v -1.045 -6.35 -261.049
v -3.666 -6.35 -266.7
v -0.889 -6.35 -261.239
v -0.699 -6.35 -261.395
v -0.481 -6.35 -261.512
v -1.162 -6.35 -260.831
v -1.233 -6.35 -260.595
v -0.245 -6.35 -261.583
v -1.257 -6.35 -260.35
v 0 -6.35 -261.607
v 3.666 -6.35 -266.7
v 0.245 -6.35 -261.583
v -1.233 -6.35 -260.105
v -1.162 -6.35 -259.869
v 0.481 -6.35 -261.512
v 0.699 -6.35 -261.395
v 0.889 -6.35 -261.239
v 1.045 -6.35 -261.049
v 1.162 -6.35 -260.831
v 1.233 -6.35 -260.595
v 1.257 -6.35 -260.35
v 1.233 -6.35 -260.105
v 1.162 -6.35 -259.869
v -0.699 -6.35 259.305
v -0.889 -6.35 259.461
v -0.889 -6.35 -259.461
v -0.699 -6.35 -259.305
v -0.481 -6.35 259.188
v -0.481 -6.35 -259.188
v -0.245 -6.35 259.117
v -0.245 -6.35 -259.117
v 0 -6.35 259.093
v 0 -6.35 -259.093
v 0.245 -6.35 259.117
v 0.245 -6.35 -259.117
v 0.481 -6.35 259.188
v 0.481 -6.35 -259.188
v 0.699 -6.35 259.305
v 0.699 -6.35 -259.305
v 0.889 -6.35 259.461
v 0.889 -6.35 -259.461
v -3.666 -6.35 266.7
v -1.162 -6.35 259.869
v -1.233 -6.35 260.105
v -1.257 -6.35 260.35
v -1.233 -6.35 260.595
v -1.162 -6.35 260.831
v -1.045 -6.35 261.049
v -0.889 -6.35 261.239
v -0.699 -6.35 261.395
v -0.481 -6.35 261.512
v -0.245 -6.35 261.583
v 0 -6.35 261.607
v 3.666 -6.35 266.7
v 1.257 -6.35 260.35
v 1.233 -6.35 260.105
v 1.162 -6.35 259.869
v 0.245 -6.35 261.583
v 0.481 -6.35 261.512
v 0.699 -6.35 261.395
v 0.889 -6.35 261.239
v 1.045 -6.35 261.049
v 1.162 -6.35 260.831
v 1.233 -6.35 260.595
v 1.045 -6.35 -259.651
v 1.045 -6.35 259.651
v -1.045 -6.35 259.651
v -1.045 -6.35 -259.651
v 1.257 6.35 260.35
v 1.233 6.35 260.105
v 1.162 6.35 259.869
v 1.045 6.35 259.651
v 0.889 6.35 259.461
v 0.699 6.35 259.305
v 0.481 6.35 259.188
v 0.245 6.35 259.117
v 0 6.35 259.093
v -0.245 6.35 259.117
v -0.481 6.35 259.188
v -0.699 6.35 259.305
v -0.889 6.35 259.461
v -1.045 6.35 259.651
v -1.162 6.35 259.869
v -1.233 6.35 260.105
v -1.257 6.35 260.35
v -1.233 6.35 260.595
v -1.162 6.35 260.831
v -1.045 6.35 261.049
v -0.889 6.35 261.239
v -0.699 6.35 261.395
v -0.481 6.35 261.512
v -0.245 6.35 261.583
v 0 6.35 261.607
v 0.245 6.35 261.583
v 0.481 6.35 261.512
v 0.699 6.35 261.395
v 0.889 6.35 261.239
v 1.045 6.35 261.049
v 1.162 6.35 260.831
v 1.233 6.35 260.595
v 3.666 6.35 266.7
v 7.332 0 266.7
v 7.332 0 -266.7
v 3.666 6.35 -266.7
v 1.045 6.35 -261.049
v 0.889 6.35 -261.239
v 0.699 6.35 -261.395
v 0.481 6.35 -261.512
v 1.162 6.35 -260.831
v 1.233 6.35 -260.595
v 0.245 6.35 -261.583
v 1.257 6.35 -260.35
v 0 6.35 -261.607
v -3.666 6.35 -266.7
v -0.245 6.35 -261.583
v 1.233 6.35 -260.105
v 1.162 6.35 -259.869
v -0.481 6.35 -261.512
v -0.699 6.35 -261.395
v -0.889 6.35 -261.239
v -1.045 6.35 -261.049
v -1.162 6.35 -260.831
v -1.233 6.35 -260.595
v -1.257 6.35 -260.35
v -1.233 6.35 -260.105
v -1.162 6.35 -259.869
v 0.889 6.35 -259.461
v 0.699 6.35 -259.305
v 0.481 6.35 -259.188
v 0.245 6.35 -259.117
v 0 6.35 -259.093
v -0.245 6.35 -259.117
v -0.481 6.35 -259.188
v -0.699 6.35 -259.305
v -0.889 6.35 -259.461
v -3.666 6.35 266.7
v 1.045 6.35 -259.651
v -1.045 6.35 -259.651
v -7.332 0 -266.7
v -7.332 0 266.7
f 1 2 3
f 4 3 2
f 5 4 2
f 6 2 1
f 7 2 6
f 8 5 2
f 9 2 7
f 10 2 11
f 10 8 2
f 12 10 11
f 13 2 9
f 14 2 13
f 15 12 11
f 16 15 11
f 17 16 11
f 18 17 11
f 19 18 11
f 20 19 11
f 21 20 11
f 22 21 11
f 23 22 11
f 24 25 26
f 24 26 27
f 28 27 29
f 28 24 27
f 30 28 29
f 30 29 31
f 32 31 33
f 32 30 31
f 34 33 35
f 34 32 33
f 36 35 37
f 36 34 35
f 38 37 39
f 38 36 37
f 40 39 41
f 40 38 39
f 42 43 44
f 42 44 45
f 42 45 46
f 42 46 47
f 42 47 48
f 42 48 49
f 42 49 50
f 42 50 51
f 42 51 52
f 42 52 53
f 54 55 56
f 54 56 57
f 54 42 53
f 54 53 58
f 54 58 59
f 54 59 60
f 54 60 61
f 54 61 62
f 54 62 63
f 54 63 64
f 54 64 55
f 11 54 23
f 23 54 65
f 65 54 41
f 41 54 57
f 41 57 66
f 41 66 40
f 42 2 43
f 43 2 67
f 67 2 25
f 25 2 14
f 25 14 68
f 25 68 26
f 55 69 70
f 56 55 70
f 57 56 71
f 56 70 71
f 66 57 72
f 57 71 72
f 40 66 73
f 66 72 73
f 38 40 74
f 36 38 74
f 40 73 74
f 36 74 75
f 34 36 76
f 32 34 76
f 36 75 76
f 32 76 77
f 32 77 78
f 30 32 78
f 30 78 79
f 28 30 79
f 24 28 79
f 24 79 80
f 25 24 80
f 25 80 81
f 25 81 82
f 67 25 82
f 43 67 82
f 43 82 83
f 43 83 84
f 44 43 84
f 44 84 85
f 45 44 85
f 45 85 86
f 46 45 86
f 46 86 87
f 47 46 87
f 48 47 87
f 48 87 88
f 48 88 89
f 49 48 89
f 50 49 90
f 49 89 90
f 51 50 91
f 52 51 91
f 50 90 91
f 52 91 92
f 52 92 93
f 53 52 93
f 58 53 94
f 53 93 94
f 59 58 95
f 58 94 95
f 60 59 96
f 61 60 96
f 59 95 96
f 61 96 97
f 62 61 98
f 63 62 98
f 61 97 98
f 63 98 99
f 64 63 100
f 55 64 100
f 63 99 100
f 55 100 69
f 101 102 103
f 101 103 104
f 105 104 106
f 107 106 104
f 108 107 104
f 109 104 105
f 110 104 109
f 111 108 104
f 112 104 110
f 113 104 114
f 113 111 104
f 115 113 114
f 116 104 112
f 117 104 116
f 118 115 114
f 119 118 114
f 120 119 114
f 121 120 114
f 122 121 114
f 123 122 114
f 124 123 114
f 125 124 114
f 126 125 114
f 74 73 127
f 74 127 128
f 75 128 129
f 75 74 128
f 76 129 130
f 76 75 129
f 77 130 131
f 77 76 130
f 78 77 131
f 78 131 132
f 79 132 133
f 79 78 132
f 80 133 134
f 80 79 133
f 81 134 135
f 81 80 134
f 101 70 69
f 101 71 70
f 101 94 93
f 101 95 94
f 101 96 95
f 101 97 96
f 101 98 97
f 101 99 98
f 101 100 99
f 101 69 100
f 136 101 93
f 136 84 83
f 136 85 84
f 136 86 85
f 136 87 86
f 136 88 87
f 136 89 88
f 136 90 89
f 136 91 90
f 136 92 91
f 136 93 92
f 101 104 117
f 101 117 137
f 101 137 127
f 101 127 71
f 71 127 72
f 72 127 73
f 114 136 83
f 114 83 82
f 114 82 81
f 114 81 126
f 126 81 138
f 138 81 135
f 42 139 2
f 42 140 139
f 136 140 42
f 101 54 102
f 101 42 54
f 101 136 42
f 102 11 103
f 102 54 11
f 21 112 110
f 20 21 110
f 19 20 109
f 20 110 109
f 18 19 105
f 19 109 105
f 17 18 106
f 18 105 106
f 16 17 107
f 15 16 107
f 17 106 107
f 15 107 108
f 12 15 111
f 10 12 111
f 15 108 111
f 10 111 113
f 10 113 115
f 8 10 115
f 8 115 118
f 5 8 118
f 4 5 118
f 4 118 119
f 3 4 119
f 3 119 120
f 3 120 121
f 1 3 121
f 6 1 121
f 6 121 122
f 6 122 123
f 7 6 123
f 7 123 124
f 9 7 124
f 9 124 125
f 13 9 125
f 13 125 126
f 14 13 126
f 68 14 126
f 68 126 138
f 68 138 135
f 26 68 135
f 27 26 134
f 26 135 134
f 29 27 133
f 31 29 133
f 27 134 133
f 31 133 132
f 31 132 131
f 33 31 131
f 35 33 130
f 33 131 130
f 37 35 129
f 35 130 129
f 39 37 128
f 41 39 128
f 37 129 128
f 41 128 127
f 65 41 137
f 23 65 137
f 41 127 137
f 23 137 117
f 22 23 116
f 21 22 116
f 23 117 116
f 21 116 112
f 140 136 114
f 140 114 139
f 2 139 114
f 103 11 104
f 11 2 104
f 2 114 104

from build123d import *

# Parameters (mm, degrees)
BOSS_EXTRUDE1_DEPTH = 266.7
SKETCH2_R           = 1.2573
CUT_EXTRUDE1_DEPTH  = 13.7


with BuildPart() as part:
    # Sketch1 → Boss-Extrude1 (new body, symmetric)
    with BuildSketch(Plane.XY):
        Polygon((3.666174209, -6.35), (7.332348419, 0), (3.666174209, 6.35), (-3.666174209, 6.35), (-7.332348419, 0), (-3.666174209, -6.35), align=None)
    extrude(amount=BOSS_EXTRUDE1_DEPTH, both=True)

    # Sketch2 → Cut-Extrude1 (cut, through all)
    with BuildSketch(Plane(origin=(0, 6.35, 0), x_dir=(1, 0, 0), z_dir=(0, 1, 0))):
        with Locations((0, -260.35)):
            Circle(SKETCH2_R)
        with Locations((0, 260.35)):
            Circle(SKETCH2_R)
    extrude(amount=-CUT_EXTRUDE1_DEPTH, mode=Mode.SUBTRACT)


solid = part.part
